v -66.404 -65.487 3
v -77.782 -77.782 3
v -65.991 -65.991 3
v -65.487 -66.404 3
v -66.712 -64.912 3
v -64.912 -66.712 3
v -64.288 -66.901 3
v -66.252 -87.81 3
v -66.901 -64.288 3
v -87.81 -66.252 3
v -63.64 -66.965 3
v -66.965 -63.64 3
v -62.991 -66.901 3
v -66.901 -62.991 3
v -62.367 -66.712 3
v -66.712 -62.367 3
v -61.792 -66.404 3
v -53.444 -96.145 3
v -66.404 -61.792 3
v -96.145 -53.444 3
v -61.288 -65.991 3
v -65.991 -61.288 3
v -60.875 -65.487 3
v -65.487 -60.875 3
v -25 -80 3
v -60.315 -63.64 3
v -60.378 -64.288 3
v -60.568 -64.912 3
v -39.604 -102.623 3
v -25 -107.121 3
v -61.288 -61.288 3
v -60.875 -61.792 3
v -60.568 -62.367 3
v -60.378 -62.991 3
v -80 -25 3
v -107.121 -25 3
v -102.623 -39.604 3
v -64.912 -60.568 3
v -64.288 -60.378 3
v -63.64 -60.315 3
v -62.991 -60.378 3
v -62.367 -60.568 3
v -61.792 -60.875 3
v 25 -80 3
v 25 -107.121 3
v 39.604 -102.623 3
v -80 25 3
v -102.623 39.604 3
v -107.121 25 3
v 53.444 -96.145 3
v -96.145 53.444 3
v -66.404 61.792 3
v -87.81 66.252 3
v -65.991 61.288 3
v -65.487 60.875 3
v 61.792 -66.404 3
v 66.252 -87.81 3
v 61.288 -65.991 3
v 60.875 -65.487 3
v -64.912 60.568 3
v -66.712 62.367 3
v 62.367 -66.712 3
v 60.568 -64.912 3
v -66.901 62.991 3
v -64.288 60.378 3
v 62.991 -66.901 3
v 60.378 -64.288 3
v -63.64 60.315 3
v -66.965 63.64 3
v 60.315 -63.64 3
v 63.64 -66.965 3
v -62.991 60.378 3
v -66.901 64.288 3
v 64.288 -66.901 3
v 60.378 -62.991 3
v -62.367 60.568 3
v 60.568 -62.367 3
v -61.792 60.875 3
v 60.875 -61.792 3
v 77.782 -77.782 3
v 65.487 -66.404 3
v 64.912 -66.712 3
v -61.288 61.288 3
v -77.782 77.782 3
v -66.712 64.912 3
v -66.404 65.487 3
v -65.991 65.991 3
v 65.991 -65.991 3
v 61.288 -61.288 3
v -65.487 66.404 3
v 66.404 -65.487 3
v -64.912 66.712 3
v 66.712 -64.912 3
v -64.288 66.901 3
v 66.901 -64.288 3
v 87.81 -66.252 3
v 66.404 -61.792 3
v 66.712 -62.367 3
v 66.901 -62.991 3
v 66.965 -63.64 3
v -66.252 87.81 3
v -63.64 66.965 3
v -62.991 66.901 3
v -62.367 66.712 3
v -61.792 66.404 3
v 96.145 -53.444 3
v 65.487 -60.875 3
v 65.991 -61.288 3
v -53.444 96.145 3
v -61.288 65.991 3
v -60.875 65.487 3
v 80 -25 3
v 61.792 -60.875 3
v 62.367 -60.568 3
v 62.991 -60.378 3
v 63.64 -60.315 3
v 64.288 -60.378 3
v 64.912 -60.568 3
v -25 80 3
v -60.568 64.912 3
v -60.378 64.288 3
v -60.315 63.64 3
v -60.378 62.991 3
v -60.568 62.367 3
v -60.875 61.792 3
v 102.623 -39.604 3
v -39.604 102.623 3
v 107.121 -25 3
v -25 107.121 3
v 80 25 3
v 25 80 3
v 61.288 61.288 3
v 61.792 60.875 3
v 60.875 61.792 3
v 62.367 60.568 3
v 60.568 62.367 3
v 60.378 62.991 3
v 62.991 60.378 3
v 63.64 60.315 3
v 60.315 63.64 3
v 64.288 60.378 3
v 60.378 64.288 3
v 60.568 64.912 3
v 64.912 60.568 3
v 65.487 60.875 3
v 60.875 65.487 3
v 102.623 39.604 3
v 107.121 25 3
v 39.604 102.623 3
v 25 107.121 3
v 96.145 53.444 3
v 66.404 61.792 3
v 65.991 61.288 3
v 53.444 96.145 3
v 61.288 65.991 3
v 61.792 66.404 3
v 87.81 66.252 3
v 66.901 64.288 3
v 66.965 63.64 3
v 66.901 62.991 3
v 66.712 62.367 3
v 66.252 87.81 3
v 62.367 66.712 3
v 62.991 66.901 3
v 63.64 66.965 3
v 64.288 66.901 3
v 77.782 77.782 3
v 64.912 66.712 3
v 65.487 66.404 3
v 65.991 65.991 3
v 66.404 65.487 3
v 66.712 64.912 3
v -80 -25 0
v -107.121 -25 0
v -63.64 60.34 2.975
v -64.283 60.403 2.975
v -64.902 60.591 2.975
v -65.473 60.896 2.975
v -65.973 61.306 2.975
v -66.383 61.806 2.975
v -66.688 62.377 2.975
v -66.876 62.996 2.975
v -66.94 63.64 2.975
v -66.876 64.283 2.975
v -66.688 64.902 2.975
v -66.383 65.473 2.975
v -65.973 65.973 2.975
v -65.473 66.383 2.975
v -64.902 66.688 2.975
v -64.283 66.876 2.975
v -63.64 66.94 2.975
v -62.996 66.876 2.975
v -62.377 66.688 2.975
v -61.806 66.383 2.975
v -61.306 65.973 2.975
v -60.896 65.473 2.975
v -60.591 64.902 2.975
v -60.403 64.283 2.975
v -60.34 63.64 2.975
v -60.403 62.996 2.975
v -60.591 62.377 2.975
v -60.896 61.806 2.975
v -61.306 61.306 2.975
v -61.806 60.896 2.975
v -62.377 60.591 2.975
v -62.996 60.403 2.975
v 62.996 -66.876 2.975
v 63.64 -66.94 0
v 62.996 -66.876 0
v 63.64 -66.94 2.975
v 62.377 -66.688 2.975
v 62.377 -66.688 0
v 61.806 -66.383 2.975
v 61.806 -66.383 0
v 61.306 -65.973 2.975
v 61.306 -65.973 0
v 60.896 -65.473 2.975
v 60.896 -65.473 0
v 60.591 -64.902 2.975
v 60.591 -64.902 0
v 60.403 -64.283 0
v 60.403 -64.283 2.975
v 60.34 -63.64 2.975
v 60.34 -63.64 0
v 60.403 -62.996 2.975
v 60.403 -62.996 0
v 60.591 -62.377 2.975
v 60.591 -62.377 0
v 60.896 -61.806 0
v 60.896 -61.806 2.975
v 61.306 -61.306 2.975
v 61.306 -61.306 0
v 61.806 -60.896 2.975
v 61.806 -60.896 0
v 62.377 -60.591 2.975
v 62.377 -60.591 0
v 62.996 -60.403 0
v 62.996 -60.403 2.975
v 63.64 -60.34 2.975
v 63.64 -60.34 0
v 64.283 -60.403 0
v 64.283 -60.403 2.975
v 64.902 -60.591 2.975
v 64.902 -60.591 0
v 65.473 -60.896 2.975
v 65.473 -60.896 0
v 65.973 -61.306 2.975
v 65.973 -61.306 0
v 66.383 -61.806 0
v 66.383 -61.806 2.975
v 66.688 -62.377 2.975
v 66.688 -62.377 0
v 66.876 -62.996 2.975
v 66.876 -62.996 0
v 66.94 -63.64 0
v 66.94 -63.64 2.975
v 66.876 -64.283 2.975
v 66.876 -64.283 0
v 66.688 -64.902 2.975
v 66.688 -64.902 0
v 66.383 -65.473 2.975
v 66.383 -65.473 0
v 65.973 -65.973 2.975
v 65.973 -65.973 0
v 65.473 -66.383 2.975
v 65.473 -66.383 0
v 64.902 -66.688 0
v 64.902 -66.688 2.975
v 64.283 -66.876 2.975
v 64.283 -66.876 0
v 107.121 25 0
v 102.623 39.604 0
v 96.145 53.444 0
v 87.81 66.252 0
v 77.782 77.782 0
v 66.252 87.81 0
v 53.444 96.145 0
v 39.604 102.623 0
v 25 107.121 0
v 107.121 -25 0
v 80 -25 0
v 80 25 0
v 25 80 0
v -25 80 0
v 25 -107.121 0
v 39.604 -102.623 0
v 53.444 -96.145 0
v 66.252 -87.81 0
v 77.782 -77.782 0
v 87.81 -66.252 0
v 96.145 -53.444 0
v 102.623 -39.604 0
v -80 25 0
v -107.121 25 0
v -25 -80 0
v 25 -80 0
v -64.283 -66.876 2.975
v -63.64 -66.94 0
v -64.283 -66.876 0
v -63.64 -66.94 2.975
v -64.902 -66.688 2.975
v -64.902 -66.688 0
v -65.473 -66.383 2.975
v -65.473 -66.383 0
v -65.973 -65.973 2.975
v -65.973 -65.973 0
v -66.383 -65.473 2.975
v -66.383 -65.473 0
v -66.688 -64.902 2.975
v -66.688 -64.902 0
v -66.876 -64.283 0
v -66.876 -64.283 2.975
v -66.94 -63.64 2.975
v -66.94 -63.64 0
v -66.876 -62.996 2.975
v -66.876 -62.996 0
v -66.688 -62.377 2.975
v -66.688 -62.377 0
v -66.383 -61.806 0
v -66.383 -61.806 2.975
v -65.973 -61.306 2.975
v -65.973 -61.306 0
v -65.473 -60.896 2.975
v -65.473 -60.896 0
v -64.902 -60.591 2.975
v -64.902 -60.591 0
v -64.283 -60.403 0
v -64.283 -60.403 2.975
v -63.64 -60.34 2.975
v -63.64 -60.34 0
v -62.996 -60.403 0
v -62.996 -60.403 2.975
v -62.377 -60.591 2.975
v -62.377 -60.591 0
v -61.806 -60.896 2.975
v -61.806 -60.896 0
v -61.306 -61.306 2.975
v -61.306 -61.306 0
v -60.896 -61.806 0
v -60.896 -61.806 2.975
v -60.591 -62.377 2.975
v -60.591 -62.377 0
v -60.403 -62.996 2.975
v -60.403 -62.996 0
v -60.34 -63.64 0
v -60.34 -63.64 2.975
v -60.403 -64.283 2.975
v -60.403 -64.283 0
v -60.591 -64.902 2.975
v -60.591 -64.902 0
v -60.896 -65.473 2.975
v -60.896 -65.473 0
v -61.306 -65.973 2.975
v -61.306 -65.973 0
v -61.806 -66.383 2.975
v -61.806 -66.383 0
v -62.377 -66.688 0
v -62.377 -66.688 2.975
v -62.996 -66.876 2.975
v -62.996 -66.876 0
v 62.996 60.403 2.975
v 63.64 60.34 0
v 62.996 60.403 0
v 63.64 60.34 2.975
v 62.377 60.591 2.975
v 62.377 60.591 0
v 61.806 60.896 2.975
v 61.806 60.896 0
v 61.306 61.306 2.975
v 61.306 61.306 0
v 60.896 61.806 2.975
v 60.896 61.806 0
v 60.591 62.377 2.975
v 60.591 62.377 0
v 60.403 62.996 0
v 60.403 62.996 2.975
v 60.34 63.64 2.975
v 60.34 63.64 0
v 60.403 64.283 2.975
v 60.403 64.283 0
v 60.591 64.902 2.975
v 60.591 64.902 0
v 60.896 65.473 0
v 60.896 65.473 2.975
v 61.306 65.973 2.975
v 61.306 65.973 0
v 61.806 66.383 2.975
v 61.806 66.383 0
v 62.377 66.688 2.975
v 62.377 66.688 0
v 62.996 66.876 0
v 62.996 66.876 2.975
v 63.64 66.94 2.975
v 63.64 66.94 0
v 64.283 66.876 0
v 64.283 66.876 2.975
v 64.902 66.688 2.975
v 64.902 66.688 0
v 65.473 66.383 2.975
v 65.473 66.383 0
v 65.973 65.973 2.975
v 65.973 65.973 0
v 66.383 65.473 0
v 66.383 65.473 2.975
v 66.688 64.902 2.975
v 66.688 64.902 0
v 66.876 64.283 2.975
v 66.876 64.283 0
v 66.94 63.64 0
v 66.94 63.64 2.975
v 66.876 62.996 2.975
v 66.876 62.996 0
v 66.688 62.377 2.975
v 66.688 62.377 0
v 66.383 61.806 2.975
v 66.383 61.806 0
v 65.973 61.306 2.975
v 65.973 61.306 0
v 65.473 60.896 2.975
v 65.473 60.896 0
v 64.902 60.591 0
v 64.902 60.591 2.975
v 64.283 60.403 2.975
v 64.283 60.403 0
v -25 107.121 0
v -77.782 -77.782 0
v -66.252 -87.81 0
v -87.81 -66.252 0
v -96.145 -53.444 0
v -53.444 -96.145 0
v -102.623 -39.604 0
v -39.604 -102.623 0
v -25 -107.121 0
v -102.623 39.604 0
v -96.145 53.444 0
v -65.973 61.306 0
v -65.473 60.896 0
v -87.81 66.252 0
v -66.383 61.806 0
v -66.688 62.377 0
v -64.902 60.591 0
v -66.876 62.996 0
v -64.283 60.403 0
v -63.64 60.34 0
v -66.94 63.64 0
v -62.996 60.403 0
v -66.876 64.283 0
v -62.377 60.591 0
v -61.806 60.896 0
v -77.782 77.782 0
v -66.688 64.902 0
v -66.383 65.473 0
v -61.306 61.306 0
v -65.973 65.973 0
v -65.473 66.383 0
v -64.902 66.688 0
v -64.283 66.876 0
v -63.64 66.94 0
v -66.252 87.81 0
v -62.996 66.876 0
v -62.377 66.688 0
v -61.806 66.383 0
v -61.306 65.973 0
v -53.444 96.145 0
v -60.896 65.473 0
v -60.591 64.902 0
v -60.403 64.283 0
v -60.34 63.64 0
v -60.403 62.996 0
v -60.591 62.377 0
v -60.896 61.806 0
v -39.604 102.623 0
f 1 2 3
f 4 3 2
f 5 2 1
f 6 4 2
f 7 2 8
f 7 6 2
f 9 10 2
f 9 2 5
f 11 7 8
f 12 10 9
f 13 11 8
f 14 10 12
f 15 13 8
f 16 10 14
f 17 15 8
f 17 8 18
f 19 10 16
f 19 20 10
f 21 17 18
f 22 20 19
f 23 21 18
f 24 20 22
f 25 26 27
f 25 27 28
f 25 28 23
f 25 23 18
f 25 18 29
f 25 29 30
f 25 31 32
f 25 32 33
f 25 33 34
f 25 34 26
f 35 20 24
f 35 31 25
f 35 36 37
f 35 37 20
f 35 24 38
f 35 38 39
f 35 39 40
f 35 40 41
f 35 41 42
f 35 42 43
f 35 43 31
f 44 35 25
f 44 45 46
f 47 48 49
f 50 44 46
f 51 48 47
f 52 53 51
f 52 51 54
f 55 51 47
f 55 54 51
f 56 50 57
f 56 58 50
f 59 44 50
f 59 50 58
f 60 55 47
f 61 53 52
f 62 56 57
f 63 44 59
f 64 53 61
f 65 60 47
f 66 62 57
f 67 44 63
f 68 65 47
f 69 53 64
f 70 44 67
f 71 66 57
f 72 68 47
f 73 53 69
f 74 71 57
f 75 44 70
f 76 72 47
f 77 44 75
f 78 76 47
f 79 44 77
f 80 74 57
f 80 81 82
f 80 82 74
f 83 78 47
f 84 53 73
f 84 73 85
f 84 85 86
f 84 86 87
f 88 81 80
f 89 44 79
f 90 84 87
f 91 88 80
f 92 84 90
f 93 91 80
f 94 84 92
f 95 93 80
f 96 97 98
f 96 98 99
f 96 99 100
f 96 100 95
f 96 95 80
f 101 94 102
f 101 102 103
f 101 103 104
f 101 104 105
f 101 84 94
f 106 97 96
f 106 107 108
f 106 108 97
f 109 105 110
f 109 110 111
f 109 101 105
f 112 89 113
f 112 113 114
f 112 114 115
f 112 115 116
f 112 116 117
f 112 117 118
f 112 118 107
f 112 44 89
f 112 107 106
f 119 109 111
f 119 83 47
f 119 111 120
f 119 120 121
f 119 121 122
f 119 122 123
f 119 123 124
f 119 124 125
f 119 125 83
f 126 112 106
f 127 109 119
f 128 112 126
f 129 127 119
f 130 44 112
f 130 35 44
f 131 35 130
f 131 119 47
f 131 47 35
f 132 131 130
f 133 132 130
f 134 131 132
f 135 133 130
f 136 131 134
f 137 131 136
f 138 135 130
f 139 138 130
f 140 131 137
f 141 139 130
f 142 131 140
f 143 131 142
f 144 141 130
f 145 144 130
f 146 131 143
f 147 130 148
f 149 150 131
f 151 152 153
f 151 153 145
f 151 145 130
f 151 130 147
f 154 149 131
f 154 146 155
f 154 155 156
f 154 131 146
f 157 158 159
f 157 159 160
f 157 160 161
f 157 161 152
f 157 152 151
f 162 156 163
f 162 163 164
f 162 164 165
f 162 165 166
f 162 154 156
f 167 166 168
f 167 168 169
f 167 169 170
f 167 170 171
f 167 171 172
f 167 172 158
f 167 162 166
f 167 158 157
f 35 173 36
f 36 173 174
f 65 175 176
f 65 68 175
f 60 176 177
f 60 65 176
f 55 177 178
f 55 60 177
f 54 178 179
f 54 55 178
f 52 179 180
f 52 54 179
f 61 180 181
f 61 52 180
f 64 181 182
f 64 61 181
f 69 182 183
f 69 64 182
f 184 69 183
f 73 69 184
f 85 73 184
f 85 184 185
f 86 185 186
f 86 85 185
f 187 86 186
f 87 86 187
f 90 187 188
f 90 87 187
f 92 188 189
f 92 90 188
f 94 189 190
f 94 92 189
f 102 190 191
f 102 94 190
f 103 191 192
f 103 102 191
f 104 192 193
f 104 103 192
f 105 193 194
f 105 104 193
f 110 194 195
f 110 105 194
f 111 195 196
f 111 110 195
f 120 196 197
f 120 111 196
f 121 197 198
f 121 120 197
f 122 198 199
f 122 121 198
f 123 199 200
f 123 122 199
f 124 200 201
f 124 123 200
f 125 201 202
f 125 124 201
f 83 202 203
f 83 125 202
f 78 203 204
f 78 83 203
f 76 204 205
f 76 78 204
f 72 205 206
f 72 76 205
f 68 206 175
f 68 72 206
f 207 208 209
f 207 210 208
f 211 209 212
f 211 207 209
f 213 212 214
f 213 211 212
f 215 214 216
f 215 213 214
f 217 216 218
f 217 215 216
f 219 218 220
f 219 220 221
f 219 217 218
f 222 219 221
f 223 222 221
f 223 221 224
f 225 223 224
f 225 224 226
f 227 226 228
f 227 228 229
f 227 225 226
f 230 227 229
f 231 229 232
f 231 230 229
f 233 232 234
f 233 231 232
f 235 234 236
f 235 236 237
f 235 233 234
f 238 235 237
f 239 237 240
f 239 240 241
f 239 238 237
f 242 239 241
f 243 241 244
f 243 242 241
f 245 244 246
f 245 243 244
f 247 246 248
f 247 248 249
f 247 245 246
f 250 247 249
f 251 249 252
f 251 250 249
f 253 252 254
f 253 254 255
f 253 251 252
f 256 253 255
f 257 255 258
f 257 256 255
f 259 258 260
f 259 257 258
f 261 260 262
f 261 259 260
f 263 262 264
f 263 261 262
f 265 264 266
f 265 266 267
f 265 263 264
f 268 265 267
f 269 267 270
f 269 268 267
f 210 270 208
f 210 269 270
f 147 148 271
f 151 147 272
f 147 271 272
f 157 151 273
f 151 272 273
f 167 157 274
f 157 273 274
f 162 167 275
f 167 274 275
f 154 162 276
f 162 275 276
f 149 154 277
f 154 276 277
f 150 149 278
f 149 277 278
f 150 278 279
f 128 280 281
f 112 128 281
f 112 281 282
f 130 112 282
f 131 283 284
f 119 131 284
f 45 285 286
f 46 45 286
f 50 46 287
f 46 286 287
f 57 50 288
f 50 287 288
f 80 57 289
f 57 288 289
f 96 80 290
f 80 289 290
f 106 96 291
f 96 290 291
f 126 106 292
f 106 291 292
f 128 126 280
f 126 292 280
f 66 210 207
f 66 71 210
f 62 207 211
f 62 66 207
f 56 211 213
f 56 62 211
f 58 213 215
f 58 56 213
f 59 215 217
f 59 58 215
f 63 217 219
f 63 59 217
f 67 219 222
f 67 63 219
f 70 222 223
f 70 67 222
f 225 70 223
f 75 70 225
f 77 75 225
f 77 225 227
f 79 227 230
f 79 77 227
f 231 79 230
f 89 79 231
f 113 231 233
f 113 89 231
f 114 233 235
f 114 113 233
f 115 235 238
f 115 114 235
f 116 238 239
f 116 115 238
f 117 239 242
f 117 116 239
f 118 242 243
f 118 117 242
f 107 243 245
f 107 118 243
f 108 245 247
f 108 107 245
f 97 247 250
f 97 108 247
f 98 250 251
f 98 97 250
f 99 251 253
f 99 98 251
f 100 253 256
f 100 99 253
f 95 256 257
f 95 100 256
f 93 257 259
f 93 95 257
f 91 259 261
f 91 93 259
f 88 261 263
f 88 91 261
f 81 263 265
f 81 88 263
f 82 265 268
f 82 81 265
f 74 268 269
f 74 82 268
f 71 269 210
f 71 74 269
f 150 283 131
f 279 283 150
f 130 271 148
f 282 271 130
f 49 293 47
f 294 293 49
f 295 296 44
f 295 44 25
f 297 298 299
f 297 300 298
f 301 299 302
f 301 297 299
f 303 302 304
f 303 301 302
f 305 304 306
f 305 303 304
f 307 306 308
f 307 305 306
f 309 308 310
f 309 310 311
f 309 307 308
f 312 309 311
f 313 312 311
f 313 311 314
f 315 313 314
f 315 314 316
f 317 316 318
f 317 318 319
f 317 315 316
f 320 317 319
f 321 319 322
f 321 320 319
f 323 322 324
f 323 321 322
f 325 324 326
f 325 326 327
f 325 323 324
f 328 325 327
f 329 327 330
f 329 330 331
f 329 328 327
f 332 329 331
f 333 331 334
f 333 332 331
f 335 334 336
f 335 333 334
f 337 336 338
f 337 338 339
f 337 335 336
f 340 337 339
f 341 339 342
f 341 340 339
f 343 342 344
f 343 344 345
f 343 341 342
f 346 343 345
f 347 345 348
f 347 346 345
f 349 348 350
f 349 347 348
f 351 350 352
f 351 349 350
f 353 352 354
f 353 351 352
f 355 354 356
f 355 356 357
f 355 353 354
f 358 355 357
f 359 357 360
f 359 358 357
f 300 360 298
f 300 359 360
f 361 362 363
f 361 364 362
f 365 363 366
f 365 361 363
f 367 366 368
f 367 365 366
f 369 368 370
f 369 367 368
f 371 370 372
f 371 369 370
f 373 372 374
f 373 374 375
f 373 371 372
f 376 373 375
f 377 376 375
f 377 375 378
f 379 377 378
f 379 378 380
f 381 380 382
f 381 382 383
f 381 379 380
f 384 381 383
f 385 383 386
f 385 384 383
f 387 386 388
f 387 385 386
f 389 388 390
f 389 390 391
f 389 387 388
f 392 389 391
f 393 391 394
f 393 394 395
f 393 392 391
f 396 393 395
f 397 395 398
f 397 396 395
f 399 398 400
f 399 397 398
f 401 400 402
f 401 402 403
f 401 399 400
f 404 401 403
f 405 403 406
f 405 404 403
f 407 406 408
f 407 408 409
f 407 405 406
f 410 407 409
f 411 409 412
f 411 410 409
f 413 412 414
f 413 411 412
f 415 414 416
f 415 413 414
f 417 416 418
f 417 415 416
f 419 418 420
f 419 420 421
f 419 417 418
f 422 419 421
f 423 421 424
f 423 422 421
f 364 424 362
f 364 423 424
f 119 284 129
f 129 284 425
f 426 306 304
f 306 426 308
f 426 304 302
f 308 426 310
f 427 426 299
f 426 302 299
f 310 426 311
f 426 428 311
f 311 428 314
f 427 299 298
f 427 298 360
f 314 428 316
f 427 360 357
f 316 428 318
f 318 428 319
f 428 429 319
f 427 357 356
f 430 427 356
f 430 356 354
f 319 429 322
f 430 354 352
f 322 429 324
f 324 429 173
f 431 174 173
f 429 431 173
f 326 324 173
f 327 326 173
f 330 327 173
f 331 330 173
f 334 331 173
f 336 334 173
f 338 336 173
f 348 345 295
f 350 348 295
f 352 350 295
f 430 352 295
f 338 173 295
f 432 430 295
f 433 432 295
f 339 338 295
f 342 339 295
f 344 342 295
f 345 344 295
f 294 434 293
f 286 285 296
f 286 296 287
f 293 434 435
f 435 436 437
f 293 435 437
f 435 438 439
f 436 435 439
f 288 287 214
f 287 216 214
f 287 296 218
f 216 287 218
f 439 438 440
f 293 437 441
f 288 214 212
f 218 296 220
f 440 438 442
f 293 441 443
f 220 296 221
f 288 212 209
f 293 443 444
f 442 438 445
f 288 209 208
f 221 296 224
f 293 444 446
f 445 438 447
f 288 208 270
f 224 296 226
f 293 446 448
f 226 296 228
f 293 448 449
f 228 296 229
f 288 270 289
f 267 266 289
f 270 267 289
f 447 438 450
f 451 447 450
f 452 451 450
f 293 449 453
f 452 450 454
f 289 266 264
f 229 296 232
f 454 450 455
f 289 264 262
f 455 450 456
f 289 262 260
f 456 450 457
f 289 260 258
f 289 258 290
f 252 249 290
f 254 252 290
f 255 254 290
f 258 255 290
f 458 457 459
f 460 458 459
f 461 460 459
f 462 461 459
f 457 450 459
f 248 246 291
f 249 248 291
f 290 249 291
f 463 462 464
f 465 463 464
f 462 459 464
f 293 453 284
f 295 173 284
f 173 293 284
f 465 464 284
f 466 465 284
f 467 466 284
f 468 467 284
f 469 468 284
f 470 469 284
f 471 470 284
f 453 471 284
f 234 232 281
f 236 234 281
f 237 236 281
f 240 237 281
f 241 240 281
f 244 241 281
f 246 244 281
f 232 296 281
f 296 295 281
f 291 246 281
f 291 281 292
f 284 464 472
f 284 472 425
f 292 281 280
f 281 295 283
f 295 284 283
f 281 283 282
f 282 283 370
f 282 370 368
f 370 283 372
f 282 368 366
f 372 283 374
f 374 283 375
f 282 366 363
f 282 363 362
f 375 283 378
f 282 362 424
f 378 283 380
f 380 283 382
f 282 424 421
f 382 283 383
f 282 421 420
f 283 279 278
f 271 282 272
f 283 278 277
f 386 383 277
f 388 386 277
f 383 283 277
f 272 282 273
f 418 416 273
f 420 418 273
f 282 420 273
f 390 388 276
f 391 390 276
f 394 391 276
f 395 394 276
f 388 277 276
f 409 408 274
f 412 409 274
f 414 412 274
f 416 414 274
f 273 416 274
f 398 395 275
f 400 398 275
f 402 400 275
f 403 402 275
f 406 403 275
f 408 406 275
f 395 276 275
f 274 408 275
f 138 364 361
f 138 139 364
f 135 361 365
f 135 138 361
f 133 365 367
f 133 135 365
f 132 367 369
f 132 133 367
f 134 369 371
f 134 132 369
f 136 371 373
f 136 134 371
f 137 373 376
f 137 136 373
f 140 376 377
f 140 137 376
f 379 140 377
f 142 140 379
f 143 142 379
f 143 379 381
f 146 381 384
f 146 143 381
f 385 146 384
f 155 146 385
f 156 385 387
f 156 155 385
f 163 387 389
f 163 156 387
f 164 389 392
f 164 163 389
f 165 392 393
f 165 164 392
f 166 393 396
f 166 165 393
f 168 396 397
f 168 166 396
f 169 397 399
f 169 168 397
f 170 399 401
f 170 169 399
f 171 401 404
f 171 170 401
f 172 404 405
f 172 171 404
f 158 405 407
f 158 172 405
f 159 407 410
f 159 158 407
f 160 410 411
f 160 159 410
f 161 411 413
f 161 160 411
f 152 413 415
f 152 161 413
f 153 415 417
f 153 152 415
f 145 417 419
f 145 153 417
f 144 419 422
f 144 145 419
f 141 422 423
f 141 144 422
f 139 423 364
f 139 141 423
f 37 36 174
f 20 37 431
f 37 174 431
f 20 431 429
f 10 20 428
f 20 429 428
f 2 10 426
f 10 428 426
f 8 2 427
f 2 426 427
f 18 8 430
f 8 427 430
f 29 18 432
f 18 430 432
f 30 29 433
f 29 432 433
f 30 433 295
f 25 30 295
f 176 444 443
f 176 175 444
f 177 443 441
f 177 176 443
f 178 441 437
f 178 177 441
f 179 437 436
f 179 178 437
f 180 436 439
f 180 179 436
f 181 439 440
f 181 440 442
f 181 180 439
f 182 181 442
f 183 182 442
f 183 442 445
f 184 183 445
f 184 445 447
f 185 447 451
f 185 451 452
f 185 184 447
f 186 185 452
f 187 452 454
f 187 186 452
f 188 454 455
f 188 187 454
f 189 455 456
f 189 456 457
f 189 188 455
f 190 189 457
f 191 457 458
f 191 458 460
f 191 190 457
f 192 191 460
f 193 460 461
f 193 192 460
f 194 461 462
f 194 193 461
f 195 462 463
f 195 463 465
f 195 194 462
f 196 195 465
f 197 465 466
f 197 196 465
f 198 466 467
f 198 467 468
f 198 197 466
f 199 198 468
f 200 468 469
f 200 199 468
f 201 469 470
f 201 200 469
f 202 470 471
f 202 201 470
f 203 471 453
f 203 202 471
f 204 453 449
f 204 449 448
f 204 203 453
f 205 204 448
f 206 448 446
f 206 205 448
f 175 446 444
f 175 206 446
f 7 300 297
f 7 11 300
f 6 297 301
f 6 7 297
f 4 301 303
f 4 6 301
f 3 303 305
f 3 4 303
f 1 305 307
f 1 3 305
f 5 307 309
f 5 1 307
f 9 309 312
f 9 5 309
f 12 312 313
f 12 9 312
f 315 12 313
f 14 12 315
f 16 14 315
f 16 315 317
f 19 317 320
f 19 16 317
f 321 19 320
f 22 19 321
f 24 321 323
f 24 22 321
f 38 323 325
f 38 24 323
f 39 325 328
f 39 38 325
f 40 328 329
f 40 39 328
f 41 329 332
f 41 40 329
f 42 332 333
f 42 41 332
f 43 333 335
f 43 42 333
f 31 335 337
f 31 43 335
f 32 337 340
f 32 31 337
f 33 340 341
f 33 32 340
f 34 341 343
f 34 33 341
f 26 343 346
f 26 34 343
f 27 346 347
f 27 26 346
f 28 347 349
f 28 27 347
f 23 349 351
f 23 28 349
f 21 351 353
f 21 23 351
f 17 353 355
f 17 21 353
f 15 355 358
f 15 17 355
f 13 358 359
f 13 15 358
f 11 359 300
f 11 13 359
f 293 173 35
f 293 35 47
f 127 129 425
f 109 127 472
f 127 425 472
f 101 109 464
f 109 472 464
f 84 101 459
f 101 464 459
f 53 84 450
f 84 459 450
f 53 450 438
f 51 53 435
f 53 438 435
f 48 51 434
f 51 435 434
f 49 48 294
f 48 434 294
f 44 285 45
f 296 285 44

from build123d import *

# Parameters (mm, degrees)
ESQUISSE1_R               = 110
BOSS_EXTRU_1_DEPTH        = 3
D_GAGEMENT_M61_AT_2_COUNT = 2
D_GAGEMENT_M61_AT_2_PITCH = 127.279220614
D_GAGEMENT_M61_AT_3_COUNT = 2
D_GAGEMENT_M61_AT_3_PITCH = 127.279220614
D_GAGEMENT_M61_AT_4_COUNT = 2
D_GAGEMENT_M61_AT_4_PITCH = 180
ESQUISSE2_W               = 30
ESQUISSE2_H               = 50
ESQUISSE2_W_2             = 50
ESQUISSE2_H_2             = 30
ENL_V_MAT_EXTRU_1_DEPTH   = 10


with BuildPart() as part:
    # Esquisse1 → Boss.-Extru.1 (new body)
    with BuildSketch(Plane.XY):
        Circle(ESQUISSE1_R)
    extrude(amount=BOSS_EXTRU_1_DEPTH)

    # Esquisse4 → Dégagement M61 (revolve, cut)
    with BuildSketch(Plane(origin=(-63.639610307, 63.639610307, 3), x_dir=(0, -1, 0), z_dir=(1, 0, 0))):
        Polygon((0, 0), (0, 3), (3.3, 3), (3.3, 0.025), (3.325, 0), align=None)
    d_gagement_m61 = revolve(axis=Axis((-63.639610307, 63.639610307, 9.35), (0, 0, -1)), mode=Mode.SUBTRACT)

    # Dégagement M61 at 2: Dégagement M61 ×2
    with Locations(*[(i * D_GAGEMENT_M61_AT_2_PITCH, 0, 0) for i in range(1, D_GAGEMENT_M61_AT_2_COUNT)]):
        add(d_gagement_m61, mode=Mode.SUBTRACT)

    # Dégagement M61 at 3: Dégagement M61 ×2
    with Locations(*[(0, -i * D_GAGEMENT_M61_AT_3_PITCH, 0) for i in range(1, D_GAGEMENT_M61_AT_3_COUNT)]):
        add(d_gagement_m61, mode=Mode.SUBTRACT)

    # Dégagement M61 at 4: Dégagement M61 ×2
    with Locations(*[Vector(0.7071067811865517, -0.7071067811865435, 0) * (i * D_GAGEMENT_M61_AT_4_PITCH) for i in range(1, D_GAGEMENT_M61_AT_4_COUNT)]):
        add(d_gagement_m61, mode=Mode.SUBTRACT)

    # Esquisse2 → Enlèv. mat.-Extru.1 (cut)
    with BuildSketch(Plane(origin=(0, 0, 0), x_dir=(-1, 0, 0), z_dir=(0, 0, -1))):
        with Locations((95, 0)):
            Rectangle(ESQUISSE2_W, ESQUISSE2_H)
        with Locations((-95, 0)):
            Rectangle(ESQUISSE2_W, ESQUISSE2_H)
        with Locations((0, -95)):
            Rectangle(ESQUISSE2_W_2, ESQUISSE2_H_2)
        with Locations((0, 95)):
            Rectangle(ESQUISSE2_W_2, ESQUISSE2_H_2)
    extrude(amount=-ENL_V_MAT_EXTRU_1_DEPTH, mode=Mode.SUBTRACT)


solid = part.part
